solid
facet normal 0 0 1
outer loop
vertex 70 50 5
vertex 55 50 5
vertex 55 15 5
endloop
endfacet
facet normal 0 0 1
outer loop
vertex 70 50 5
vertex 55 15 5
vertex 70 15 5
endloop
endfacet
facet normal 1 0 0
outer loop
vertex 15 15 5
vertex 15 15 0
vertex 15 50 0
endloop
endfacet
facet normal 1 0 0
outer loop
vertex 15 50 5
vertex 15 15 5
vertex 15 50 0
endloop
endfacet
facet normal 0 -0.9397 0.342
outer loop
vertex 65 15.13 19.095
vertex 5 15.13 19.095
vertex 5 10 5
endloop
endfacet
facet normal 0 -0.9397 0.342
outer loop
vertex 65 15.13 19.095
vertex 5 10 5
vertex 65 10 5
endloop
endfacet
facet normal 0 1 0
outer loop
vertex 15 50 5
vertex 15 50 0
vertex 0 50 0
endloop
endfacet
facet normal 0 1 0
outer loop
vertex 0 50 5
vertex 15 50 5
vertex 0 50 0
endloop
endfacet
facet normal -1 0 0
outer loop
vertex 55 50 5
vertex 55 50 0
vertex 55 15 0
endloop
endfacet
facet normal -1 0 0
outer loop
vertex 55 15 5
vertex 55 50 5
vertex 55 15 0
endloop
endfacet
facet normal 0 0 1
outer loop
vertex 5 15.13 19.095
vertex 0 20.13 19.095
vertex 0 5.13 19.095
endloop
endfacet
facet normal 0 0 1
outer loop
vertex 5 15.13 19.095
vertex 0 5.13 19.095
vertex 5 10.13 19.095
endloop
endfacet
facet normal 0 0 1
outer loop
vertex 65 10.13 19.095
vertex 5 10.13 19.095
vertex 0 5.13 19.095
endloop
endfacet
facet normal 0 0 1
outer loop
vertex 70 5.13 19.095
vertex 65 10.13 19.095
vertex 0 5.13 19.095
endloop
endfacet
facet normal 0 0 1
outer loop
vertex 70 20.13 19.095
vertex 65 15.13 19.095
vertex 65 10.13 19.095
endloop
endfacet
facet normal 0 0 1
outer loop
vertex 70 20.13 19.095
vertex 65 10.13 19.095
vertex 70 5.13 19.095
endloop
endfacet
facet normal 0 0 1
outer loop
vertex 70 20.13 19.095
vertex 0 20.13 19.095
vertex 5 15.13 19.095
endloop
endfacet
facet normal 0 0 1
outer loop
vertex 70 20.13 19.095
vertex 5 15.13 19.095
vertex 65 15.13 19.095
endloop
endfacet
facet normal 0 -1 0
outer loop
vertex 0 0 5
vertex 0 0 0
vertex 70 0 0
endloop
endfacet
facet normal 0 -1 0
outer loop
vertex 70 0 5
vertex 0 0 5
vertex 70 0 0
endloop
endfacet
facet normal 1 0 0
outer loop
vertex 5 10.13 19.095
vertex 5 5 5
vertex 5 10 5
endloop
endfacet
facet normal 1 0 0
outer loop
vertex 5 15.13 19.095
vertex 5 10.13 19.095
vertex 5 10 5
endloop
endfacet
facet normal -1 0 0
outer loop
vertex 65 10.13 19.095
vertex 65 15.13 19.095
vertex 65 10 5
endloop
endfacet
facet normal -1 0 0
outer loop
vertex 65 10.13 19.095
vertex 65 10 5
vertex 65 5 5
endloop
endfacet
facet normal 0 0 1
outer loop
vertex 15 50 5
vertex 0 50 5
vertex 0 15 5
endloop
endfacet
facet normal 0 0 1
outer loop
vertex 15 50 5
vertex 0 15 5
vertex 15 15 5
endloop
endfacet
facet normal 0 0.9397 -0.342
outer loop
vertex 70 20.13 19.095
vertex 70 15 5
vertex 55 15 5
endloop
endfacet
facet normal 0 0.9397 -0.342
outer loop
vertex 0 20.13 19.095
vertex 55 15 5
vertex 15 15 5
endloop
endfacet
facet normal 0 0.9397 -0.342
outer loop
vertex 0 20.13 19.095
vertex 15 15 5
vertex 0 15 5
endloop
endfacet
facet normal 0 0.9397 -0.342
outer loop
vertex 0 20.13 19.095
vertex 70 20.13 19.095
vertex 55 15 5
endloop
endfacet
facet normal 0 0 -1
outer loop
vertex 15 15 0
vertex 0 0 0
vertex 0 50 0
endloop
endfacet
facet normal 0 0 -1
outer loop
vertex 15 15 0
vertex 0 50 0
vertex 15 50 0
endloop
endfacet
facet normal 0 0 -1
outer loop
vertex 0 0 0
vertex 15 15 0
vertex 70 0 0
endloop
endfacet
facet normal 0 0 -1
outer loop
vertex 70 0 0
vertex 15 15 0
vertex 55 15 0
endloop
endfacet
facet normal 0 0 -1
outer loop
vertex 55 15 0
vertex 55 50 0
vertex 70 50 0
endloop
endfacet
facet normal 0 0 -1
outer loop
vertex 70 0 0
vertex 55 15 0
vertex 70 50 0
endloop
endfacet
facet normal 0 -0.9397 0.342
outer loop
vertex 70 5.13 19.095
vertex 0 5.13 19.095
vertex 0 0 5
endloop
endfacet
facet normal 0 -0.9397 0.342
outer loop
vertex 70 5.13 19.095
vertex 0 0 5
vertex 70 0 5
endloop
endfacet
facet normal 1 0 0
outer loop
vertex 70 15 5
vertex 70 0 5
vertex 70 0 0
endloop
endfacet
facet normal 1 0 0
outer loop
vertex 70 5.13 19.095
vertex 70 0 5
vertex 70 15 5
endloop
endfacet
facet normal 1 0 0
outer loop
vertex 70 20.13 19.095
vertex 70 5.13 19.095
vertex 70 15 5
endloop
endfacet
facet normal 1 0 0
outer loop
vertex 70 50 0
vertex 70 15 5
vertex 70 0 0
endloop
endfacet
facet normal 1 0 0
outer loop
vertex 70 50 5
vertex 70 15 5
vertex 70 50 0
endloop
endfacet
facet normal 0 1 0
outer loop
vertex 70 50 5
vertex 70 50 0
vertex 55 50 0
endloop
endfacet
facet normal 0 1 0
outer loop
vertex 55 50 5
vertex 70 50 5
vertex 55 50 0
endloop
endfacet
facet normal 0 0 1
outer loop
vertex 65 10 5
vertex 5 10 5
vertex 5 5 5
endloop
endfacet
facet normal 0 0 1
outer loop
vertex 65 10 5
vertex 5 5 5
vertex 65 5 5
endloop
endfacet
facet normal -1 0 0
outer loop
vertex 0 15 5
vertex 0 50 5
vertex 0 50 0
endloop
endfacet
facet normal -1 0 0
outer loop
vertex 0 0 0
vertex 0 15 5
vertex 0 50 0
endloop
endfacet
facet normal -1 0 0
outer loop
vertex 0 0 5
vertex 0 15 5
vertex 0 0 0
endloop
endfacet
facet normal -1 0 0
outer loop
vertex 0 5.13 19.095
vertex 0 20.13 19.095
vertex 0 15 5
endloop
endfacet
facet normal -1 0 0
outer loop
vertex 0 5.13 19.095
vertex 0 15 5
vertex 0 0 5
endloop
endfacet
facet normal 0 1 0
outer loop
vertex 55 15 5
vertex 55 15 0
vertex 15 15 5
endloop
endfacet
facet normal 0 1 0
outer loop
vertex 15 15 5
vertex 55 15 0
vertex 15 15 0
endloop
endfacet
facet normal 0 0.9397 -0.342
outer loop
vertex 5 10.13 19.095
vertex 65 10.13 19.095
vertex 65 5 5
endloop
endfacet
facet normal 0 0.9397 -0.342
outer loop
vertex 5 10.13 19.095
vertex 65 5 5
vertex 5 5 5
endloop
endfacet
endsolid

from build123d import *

# Parameters (mm, degrees)
F1_DEPTH = 5
F3_W     = 70
F3_H     = 15
F3_W_2   = 60
F3_H_2   = 5


with BuildPart() as f1:
    # F0 (on Top) → F1 (new body)
    with BuildSketch(Plane.XY):
        Polygon((0, 50), (0, 0), (70, 0), (70, 50), (55, 50), (55, 15), (15, 15), (15, 50), align=None)
    extrude(amount=F1_DEPTH)

    # F4: sweep along a path in F2
    with BuildLine(Plane(origin=(0, 0, 0), x_dir=(0, -1, 0), z_dir=(-1, 0, 0))) as f4_path:
        Line((0, 5), (-5.1303021499, 19.0953893118))
    # F3 (on face) → F4 (sweep)
    with BuildSketch(Plane.XY.offset(5)):
        with Locations((35, 7.5)):
            Rectangle(F3_W, F3_H)
        with Locations((35, 7.5)):
            Rectangle(F3_W_2, F3_H_2, mode=Mode.SUBTRACT)
    sweep(path=f4_path.line)


solid = f1.part
